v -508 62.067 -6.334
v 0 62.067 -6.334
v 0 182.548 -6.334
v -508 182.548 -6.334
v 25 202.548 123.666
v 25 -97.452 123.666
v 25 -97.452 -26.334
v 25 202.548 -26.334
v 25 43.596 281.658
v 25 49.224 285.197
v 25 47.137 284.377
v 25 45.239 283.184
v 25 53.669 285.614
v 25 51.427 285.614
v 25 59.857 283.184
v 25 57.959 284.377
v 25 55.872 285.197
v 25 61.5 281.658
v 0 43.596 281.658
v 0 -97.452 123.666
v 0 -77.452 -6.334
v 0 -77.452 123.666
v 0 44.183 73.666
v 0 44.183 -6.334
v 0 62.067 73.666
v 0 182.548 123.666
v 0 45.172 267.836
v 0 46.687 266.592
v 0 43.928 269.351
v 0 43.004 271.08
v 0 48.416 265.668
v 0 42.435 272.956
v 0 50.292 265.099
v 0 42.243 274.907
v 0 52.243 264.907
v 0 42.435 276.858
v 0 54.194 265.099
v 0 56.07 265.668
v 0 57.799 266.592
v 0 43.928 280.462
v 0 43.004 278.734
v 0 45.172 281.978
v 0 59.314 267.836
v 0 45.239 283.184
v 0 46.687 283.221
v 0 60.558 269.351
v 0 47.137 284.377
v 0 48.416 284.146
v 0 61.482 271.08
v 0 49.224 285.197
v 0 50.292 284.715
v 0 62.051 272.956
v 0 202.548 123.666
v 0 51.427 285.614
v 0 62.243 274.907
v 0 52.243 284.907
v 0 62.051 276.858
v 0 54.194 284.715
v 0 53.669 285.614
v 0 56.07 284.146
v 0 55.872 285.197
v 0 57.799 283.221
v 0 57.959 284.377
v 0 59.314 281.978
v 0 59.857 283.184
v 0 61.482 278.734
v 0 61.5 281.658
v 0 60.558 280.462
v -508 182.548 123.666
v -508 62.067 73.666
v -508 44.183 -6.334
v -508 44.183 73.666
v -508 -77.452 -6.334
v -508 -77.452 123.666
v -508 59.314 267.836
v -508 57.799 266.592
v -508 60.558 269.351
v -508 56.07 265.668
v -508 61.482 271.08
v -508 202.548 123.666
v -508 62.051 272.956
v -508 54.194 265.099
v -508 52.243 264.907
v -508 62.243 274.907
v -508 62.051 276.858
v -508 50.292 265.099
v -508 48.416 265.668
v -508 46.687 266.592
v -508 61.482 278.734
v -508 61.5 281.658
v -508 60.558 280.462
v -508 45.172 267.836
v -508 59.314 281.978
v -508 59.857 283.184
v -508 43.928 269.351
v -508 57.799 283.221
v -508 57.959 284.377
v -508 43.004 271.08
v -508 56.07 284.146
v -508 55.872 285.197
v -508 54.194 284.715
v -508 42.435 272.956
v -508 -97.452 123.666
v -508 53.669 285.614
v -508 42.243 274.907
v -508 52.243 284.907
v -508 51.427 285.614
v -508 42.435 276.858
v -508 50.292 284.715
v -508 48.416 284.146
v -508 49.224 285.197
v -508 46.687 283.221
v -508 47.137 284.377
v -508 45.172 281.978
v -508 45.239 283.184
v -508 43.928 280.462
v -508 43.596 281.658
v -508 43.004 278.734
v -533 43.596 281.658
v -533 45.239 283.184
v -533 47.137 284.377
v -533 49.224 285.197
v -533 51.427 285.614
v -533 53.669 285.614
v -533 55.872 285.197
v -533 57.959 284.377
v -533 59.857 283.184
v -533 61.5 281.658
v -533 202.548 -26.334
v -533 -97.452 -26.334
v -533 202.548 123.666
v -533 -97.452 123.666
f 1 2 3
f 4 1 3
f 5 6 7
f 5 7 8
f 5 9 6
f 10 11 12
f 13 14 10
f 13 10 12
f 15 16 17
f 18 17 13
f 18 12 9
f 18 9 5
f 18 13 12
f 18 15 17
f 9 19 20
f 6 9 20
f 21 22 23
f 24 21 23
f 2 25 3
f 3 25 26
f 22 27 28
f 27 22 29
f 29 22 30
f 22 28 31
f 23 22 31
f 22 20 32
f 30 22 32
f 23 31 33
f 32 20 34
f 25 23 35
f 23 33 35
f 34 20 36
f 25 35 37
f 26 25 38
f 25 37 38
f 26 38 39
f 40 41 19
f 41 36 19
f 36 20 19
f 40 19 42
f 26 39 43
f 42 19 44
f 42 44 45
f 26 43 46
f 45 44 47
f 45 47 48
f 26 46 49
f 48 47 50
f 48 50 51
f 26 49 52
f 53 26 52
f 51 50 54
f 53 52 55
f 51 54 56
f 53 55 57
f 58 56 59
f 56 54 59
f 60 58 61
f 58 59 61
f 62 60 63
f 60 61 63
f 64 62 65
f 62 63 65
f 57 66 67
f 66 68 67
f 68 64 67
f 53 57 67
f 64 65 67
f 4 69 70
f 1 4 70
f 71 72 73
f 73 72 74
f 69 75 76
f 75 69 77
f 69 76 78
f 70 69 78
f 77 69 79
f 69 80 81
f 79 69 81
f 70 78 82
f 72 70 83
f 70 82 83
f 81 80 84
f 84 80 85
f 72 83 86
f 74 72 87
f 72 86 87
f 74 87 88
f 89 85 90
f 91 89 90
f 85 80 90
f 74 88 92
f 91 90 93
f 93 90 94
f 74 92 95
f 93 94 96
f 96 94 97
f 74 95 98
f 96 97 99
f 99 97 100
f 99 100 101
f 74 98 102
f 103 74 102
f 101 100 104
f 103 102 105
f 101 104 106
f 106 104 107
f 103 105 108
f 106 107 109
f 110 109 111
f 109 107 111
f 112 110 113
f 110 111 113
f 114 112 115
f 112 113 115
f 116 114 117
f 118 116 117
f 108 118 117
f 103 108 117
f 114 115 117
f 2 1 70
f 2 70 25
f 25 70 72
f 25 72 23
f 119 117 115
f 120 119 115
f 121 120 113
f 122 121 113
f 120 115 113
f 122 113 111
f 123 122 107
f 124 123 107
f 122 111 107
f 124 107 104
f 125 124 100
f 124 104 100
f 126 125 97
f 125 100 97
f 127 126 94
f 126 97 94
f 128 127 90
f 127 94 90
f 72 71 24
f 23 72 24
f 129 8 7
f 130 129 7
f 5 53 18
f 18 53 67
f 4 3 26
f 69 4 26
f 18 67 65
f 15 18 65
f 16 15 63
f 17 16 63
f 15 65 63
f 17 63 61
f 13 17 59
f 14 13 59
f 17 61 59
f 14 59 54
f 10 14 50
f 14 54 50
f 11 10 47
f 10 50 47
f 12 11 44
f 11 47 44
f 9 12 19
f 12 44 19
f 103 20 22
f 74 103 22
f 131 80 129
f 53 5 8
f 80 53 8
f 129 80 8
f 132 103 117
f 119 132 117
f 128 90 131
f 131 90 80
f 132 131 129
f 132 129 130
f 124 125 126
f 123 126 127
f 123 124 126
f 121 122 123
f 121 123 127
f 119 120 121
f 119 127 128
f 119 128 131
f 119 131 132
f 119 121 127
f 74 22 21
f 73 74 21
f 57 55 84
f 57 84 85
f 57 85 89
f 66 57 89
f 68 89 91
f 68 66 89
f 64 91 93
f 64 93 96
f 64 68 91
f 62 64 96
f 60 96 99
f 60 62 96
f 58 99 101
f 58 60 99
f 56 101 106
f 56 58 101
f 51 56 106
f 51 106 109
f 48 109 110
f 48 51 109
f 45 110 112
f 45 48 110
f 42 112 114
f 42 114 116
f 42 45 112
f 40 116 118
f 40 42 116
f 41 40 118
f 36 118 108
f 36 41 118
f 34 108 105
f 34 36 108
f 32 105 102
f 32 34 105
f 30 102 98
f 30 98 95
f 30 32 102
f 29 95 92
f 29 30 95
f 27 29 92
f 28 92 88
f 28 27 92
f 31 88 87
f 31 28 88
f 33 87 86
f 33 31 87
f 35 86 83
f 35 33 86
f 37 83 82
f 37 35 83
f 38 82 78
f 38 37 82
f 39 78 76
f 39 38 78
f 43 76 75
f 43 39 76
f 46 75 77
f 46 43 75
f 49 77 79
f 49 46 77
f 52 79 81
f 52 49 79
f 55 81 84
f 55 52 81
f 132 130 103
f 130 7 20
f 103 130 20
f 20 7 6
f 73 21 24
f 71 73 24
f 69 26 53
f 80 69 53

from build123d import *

# Parameters (mm, degrees)
F1_DEPTH = 25
F3_DEPTH = 508
F5_DEPTH = 25
F6_R     = 10
F7_DEPTH = 508
F8_W     = 508
F8_H     = 17.884616
F9_DEPTH = 80


with BuildPart() as f1:
    # F0 (on Right) → F1 (new body)
    with BuildSketch(Plane.YZ):
        with BuildLine():
            Line((-97.451926, 123.666471), (-97.451926, -26.333529))
            Line((-97.451926, -26.333529), (202.548074, -26.333529))
            Line((202.548074, -26.333529), (202.548074, 123.666471))
            Line((202.548074, 123.666471), (61.499769, 281.658165))
            ThreePointArc((61.499769, 281.658165), (52.548074, 285.666471), (43.59638, 281.658165))
            Line((43.59638, 281.658165), (-97.451926, 123.666471))
        make_face()
    extrude(amount=F1_DEPTH)

    # F2 (on face) → F3 (join)
    with BuildSketch(Plane(origin=(0, 0, 0), x_dir=(0, -1, 0), z_dir=(-1, 0, 0))):
        Polygon((-182.548074, 123.666471), (-202.548074, 123.666471), (-202.548074, -26.333529), (97.451926, -26.333529), (97.451926, 123.666471), (77.451926, 123.666471), (77.451926, -6.333529), (-182.548074, -6.333529), align=None)
    extrude(amount=F3_DEPTH)

    # F4 (on face) → F5 (join)
    with BuildSketch(Plane(origin=(-508, 0, 0), x_dir=(0, -1, 0), z_dir=(-1, 0, 0))):
        with BuildLine():
            Line((97.451926, 123.666471), (-43.59638, 281.658165))
            ThreePointArc((-43.59638, 281.658165), (-52.548074, 285.666471), (-61.499769, 281.658165))
            Line((-61.499769, 281.658165), (-202.548074, 123.666471))
            Line((-202.548074, 123.666471), (-202.548074, -26.333529))
            Line((-202.548074, -26.333529), (97.451926, -26.333529))
            Line((97.451926, -26.333529), (97.451926, 123.666471))
        make_face()
    extrude(amount=F5_DEPTH)

    # F6 (on face) → F7 (join)
    with BuildSketch(Plane.YZ):
        with Locations((52.24314, 274.906725)):
            Circle(F6_R)
    extrude(amount=-F7_DEPTH)

    # F8 (on face) → F9 (join)
    with BuildSketch(Plane.XY.offset(-6.333529)):
        with Locations((-254, 53.124996)):
            Rectangle(F8_W, F8_H)
    extrude(amount=F9_DEPTH)


solid = f1.part
